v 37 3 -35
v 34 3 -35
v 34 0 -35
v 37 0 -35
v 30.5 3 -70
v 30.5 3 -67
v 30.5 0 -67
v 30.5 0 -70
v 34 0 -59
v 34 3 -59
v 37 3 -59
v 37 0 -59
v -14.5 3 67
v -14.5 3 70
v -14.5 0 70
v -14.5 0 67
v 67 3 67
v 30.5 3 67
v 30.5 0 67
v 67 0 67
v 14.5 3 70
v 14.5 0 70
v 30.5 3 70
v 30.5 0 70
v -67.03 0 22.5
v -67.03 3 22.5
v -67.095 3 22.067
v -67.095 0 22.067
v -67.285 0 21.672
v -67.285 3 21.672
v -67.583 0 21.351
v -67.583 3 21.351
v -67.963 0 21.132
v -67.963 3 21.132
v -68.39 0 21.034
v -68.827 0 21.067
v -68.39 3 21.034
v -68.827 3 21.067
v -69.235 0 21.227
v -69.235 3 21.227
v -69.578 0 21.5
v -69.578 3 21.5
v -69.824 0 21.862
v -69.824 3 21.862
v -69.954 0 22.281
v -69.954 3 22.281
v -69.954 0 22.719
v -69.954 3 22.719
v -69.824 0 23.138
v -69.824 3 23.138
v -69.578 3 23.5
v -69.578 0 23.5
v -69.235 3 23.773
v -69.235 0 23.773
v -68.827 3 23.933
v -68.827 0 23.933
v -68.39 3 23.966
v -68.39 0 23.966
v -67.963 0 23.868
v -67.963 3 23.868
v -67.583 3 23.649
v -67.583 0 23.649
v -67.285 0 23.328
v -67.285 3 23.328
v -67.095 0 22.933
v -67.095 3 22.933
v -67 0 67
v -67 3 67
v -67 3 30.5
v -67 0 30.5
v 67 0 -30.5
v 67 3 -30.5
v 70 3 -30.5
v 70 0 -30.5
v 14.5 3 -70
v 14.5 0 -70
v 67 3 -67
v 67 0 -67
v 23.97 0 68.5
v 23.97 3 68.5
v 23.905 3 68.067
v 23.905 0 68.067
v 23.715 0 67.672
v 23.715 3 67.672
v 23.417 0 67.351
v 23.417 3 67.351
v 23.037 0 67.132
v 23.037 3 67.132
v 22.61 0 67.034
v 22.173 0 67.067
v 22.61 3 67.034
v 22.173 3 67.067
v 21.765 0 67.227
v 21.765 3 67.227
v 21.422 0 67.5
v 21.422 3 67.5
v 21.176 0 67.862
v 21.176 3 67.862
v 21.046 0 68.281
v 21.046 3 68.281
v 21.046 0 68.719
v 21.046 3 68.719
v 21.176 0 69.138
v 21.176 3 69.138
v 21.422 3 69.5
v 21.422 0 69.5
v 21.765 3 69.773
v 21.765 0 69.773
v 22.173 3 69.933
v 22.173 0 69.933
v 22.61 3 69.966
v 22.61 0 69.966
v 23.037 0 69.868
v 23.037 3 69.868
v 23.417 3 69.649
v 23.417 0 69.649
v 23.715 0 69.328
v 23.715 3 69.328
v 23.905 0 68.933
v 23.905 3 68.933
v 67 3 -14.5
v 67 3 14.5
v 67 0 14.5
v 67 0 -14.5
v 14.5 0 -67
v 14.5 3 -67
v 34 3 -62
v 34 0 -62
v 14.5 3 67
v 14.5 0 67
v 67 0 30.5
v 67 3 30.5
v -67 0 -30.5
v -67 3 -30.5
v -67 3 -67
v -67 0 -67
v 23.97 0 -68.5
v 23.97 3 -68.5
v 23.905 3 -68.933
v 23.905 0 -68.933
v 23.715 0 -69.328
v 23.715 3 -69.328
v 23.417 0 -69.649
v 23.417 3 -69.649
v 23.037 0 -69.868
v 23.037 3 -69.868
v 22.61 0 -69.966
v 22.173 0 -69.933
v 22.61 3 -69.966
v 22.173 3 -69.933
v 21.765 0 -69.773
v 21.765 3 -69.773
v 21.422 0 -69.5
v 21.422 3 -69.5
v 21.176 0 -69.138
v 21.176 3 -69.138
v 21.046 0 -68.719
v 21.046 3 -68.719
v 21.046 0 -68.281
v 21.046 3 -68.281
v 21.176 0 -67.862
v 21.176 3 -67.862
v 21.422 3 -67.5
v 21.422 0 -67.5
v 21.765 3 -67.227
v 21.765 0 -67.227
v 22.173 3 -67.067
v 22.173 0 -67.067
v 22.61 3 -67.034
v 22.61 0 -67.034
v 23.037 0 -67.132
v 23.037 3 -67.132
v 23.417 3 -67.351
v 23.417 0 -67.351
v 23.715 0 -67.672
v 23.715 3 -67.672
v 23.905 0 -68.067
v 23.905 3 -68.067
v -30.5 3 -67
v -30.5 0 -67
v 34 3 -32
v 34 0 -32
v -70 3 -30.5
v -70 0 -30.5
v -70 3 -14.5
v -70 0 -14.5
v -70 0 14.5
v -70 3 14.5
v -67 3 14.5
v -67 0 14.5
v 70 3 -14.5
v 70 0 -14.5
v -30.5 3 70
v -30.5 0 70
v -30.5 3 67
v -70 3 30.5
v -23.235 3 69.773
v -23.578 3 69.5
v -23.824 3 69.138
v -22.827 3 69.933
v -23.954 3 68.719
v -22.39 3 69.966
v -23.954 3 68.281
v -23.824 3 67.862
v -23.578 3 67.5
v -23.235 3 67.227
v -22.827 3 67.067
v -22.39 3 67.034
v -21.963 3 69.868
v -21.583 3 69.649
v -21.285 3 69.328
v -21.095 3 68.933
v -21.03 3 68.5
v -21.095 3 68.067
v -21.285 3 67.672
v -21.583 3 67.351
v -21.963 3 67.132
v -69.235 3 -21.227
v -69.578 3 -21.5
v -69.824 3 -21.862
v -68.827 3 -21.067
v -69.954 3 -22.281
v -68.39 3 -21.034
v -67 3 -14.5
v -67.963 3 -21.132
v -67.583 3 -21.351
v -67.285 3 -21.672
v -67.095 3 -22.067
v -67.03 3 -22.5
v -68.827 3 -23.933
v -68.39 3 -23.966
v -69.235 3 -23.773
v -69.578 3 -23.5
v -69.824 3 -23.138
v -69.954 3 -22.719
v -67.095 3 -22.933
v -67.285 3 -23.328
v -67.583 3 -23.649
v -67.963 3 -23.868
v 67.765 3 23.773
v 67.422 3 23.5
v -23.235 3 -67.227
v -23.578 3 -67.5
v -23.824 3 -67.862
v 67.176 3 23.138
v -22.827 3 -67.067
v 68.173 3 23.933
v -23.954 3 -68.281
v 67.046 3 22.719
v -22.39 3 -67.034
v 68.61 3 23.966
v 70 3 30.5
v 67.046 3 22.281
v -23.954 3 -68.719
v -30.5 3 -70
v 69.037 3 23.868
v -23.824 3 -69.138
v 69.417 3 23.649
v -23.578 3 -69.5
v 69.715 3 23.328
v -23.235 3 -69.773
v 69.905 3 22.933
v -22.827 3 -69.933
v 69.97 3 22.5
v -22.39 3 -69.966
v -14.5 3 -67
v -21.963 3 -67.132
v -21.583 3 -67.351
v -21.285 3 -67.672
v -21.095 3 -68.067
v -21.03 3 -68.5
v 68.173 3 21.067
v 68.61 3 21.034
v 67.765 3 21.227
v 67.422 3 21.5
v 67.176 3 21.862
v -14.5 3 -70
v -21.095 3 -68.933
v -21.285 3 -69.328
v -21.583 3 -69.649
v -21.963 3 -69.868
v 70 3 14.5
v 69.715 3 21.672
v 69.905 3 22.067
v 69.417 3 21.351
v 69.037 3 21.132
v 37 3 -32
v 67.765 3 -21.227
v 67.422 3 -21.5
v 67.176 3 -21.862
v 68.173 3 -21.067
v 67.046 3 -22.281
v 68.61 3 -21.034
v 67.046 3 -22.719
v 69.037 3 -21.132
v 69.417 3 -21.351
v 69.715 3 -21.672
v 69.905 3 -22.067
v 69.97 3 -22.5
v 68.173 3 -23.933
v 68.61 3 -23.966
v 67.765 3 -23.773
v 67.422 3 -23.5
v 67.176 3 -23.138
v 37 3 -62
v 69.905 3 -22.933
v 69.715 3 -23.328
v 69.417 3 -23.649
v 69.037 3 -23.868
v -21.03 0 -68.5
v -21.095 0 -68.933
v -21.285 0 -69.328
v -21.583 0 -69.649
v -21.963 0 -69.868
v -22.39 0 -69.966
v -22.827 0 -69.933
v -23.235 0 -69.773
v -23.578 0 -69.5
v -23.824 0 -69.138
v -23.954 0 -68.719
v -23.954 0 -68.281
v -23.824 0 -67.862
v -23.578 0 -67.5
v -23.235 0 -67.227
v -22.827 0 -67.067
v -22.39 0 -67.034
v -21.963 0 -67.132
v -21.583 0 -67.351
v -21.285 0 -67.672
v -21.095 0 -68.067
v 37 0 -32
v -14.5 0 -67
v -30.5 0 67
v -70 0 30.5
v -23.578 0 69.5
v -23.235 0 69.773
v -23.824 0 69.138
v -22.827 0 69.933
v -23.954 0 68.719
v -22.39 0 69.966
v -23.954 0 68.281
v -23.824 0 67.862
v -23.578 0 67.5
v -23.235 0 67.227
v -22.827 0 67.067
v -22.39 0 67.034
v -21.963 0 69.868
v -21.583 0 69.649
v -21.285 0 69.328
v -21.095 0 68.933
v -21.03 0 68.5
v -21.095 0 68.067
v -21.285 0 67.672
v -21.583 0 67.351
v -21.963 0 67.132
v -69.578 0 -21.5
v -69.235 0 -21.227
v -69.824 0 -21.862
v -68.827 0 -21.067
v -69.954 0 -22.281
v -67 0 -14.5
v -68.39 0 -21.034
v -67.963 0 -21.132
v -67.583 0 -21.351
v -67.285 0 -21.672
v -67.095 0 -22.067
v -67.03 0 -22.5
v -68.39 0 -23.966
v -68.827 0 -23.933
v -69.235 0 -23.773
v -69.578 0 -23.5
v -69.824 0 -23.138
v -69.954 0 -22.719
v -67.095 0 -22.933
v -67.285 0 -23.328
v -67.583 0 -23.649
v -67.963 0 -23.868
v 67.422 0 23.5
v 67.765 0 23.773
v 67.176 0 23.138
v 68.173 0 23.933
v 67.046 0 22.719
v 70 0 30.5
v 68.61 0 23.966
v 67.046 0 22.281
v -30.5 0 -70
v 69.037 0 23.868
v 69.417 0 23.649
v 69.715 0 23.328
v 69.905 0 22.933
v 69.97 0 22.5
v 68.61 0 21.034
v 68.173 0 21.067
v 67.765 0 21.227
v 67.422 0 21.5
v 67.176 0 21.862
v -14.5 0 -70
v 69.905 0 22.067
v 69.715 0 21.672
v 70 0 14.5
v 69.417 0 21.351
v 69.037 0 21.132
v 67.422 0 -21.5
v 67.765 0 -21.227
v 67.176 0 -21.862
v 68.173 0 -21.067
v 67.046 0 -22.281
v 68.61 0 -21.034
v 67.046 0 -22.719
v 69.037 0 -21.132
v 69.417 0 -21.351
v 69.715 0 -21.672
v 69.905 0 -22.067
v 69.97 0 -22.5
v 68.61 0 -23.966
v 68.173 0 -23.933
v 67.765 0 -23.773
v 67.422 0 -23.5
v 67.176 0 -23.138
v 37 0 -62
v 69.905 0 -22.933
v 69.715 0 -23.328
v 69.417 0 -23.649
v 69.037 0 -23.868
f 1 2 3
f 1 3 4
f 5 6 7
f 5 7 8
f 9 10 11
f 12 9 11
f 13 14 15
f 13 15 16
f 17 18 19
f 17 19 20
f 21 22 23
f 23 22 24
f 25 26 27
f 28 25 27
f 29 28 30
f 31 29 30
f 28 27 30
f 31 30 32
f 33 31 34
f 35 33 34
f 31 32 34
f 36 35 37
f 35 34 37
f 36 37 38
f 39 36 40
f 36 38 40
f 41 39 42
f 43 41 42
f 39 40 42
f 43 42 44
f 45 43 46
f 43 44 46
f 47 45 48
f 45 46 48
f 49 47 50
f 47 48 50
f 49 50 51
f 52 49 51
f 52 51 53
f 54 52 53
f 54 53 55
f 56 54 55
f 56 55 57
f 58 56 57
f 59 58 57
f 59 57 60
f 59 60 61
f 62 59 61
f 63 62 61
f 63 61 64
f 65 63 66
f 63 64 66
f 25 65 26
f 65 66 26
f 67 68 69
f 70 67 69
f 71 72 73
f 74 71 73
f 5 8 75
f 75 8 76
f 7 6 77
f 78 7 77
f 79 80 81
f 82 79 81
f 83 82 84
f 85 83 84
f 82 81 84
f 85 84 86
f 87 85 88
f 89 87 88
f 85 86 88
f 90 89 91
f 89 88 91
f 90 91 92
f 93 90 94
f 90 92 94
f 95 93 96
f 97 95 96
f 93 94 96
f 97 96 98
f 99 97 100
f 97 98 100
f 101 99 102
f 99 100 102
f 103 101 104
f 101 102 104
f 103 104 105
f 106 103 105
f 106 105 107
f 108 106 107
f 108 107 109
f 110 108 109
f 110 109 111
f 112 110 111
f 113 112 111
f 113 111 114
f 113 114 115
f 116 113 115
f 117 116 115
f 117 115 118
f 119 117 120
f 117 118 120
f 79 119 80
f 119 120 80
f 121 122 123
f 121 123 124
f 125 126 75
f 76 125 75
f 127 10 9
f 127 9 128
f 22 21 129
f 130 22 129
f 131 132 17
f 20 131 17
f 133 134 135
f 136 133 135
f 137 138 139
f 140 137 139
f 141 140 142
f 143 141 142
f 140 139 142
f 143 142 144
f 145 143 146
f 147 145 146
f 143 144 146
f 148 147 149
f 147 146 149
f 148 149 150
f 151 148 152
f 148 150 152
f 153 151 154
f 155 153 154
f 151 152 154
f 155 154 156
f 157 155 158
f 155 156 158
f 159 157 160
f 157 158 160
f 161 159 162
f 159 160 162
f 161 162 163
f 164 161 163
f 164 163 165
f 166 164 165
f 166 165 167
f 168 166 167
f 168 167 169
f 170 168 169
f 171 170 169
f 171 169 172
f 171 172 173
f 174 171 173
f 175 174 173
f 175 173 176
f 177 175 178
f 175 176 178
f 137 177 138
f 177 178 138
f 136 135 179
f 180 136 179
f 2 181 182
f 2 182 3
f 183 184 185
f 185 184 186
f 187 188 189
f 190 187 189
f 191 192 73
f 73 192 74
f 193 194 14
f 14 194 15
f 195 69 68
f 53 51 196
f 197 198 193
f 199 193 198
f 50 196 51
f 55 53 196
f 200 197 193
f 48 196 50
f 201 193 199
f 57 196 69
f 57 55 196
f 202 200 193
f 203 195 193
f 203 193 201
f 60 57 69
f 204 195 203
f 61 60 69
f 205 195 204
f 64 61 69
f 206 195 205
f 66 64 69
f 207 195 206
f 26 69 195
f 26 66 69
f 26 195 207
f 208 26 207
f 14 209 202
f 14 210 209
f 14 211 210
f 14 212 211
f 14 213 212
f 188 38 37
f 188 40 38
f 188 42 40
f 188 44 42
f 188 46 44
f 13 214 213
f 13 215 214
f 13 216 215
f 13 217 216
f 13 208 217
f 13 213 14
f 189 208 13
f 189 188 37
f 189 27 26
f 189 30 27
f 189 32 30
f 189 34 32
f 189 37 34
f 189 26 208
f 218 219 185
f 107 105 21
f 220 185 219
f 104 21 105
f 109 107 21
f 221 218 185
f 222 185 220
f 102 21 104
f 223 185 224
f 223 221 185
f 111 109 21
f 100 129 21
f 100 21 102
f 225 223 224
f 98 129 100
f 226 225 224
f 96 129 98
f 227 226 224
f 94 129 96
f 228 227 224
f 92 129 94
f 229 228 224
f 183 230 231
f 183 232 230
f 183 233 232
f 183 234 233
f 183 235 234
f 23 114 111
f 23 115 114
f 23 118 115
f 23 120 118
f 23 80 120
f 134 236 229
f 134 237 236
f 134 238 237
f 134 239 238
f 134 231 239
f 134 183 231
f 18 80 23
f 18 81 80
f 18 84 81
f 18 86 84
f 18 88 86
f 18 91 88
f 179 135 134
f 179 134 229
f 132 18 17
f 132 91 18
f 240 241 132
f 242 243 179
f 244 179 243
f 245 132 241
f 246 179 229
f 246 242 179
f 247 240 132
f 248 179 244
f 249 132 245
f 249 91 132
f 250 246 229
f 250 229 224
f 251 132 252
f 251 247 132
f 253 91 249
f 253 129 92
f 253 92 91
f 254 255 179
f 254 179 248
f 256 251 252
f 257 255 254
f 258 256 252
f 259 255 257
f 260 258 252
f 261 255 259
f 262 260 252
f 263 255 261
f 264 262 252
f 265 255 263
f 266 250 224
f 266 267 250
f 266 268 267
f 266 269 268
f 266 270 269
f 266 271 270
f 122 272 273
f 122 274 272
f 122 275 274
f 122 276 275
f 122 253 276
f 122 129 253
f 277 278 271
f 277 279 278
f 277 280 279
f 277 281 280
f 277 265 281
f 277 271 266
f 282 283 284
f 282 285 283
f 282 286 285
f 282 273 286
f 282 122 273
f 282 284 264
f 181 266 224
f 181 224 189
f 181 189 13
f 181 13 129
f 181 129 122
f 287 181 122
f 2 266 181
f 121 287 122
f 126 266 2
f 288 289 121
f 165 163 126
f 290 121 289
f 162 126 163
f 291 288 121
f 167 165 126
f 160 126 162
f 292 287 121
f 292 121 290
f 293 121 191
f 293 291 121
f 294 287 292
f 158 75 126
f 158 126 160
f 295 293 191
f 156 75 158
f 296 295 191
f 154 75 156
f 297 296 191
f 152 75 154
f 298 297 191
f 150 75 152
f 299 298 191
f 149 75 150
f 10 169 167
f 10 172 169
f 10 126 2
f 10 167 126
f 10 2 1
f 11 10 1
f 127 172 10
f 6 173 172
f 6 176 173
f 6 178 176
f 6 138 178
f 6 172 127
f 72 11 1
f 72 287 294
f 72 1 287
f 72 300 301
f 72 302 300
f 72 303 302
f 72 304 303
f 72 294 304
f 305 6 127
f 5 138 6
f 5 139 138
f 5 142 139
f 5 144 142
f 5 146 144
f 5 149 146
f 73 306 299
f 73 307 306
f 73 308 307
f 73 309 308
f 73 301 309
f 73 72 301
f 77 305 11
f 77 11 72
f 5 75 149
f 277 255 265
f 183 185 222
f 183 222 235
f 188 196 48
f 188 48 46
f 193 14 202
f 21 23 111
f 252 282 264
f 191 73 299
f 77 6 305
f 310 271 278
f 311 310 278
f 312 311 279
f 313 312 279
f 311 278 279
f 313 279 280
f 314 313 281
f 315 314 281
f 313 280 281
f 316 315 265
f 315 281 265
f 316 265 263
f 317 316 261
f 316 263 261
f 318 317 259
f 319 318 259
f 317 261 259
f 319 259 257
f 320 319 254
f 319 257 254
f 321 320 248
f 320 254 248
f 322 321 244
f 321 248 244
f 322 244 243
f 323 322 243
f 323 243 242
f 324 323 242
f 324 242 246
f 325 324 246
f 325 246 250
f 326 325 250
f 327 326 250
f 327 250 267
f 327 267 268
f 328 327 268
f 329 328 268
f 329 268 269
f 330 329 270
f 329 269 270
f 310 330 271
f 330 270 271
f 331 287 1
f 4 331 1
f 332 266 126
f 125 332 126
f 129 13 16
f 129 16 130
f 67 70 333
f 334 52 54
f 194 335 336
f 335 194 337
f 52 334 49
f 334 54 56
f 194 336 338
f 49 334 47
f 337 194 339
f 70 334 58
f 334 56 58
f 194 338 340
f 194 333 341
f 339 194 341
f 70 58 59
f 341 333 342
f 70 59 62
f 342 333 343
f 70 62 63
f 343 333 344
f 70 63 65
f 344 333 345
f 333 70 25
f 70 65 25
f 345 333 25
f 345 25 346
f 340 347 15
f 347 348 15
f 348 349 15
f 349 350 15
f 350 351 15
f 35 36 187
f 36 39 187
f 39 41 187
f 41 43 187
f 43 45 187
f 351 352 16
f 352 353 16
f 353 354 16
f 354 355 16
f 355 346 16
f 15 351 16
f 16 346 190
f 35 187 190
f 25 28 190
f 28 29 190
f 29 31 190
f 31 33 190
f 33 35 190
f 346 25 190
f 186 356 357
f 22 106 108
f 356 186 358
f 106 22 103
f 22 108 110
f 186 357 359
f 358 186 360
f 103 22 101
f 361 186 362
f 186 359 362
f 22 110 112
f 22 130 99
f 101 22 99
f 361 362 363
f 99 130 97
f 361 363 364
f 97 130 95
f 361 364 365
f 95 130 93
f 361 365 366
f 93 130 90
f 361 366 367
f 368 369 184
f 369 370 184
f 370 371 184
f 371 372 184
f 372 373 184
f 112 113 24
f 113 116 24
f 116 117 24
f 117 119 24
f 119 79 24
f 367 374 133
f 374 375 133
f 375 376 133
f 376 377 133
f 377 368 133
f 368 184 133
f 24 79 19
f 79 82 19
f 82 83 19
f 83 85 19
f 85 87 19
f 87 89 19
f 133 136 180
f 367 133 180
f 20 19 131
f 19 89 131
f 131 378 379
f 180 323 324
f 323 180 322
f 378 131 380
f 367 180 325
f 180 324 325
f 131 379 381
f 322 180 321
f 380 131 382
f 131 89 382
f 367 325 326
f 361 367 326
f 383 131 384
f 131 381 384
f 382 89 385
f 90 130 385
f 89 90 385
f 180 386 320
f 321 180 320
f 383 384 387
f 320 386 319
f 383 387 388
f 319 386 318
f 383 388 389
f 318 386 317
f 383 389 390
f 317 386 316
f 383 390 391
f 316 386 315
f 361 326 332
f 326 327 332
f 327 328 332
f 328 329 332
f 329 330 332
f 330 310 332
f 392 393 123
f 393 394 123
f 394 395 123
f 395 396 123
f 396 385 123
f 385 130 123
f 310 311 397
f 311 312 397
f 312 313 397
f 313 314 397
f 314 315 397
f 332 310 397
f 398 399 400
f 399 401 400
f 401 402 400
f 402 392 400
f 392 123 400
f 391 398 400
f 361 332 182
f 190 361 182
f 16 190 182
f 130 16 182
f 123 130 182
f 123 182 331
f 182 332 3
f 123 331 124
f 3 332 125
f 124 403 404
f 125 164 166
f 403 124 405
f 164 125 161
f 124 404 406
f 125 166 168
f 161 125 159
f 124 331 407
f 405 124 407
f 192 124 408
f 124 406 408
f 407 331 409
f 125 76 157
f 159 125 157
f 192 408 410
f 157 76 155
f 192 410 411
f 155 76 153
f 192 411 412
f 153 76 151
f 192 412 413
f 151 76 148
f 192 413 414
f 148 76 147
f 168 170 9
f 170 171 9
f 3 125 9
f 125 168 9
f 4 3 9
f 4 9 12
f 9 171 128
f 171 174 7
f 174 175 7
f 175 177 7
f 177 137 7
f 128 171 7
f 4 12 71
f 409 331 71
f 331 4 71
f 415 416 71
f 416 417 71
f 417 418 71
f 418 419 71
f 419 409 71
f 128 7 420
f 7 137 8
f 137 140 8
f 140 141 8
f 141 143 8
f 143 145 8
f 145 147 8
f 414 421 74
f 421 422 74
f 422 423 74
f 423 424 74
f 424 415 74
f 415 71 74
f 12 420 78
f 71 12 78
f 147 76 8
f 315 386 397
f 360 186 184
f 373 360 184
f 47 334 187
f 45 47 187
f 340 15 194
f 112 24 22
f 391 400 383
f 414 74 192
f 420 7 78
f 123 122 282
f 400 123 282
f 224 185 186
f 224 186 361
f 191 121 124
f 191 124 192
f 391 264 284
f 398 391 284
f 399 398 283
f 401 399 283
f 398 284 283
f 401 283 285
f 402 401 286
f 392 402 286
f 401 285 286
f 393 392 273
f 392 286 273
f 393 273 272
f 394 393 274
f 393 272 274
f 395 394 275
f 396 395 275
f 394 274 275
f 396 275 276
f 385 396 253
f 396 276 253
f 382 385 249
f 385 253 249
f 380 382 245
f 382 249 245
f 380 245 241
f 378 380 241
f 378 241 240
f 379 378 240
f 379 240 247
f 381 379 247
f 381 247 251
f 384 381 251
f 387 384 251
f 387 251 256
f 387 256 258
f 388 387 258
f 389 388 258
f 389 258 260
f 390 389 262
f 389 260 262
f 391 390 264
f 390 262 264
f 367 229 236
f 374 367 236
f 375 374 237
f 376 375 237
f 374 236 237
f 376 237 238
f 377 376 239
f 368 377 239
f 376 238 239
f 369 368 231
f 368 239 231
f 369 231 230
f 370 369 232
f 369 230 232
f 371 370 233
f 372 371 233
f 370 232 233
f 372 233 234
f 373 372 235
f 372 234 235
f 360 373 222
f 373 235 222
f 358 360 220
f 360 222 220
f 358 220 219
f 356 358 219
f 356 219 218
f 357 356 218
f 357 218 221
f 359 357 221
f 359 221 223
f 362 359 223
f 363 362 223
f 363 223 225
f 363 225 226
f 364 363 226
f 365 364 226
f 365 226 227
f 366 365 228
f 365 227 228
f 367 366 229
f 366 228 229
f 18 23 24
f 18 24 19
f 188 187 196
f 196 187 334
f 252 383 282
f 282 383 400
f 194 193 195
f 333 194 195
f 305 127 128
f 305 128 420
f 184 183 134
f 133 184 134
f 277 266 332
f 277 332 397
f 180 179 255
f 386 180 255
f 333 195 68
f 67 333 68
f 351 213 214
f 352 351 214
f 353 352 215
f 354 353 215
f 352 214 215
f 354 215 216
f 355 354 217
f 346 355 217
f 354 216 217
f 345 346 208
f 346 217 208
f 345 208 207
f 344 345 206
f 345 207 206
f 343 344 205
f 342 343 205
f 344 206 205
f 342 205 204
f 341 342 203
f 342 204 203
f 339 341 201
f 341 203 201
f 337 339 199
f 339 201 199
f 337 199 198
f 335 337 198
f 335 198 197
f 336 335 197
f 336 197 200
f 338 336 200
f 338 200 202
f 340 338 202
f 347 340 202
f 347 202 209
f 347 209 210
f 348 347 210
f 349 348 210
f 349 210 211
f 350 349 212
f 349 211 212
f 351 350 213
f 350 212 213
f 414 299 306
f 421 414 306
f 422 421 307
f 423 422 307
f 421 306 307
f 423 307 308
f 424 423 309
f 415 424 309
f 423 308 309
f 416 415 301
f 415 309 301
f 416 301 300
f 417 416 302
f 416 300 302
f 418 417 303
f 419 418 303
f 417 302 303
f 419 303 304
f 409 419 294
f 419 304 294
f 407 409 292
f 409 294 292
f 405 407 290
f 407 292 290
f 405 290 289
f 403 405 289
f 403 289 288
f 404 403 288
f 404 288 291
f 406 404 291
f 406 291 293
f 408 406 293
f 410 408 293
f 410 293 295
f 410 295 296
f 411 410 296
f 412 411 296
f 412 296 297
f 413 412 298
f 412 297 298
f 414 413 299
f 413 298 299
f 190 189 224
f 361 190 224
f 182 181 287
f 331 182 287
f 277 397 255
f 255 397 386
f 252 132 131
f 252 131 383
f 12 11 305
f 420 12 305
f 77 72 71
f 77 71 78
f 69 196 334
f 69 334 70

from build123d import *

# Parameters (mm, degrees)
BOSS_EXTRUDE1_DEPTH = 3
SKETCH2_W           = 3
SKETCH2_H           = 3
SKETCH2_H_2         = 36.5
SKETCH2_W_2         = 36.5
SKETCH2_W_3         = 29
SKETCH2_H_3         = 29
CUT_EXTRUDE2_DEPTH  = 3
SKETCH3_R           = 1.47
CUT_EXTRUDE3_DEPTH  = 3
SKETCH4_W           = 3
SKETCH4_H           = 3
CUT_EXTRUDE4_DEPTH  = 3


with BuildPart() as part:
    # Sketch1 → Boss-Extrude1 (new body)
    with BuildSketch(Plane(origin=(0, 0, 0), x_dir=(1, 0, 0), z_dir=(0, 1, 0))):
        Polygon((70, 70), (-70, 70), (0, 0), align=None)
        Polygon((0, 0), (-70, 70), (-70, -70), align=None)
        Polygon((70, -70), (0, 0), (-70, -70), align=None)
        Polygon((70, 70), (0, 0), (70, -70), align=None)
    extrude(amount=BOSS_EXTRUDE1_DEPTH)

    # Sketch2 → Cut-Extrude2 (cut)
    with BuildSketch(Plane(origin=(0, 3, 0), x_dir=(1, 0, 0), z_dir=(0, 1, 0))):
        with Locations((-68.5, 68.5)):
            Rectangle(SKETCH2_W, SKETCH2_H)
        with Locations((-68.5, 48.75)):
            Rectangle(SKETCH2_W, SKETCH2_H_2)
        with Locations((-48.75, 68.5)):
            Rectangle(SKETCH2_W_2, SKETCH2_H)
        with Locations((48.75, 68.5)):
            Rectangle(SKETCH2_W_2, SKETCH2_H)
        with Locations((68.5, 68.5)):
            Rectangle(SKETCH2_W, SKETCH2_H)
        with Locations((68.5, 48.75)):
            Rectangle(SKETCH2_W, SKETCH2_H_2)
        with Locations((68.5, -68.5)):
            Rectangle(SKETCH2_W, SKETCH2_H)
        with Locations((68.5, -48.75)):
            Rectangle(SKETCH2_W, SKETCH2_H_2)
        with Locations((48.75, -68.5)):
            Rectangle(SKETCH2_W_2, SKETCH2_H)
        with Locations((-48.75, -68.5)):
            Rectangle(SKETCH2_W_2, SKETCH2_H)
        with Locations((-68.5, -68.5)):
            Rectangle(SKETCH2_W, SKETCH2_H)
        with Locations((-68.5, -48.75)):
            Rectangle(SKETCH2_W, SKETCH2_H_2)
        with Locations((0, 68.5)):
            Rectangle(SKETCH2_W_3, SKETCH2_H)
        with Locations((0, -68.5)):
            Rectangle(SKETCH2_W_3, SKETCH2_H)
        with Locations((68.5, 0)):
            Rectangle(SKETCH2_W, SKETCH2_H_3)
        with Locations((-68.5, 0)):
            Rectangle(SKETCH2_W, SKETCH2_H_3)
    extrude(amount=-CUT_EXTRUDE2_DEPTH, mode=Mode.SUBTRACT)

    # Sketch3 → Cut-Extrude3 (cut)
    with BuildSketch(Plane(origin=(0, 3, 0), x_dir=(1, 0, 0), z_dir=(0, 1, 0))):
        with Locations((-22.5, 68.5)):
            Circle(SKETCH3_R)
        with Locations((22.5, 68.5)):
            Circle(SKETCH3_R)
        with Locations((22.5, -68.5)):
            Circle(SKETCH3_R)
        with Locations((-22.5, -68.5)):
            Circle(SKETCH3_R)
        with Locations((-68.5, 22.5)):
            Circle(SKETCH3_R)
        with Locations((-68.5, -22.5)):
            Circle(SKETCH3_R)
        with Locations((68.5, -22.5)):
            Circle(SKETCH3_R)
        with Locations((68.5, 22.5)):
            Circle(SKETCH3_R)
    extrude(amount=-CUT_EXTRUDE3_DEPTH, mode=Mode.SUBTRACT)

    # Sketch4 → Cut-Extrude4 (cut)
    with BuildSketch(Plane(origin=(0, 3, 0), x_dir=(1, 0, 0), z_dir=(0, 1, 0))):
        with Locations((35.5, 60.5)):
            Rectangle(SKETCH4_W, SKETCH4_H)
        with Locations((35.5, 33.5)):
            Rectangle(SKETCH4_W, SKETCH4_H)
    extrude(amount=-CUT_EXTRUDE4_DEPTH, mode=Mode.SUBTRACT)


solid = part.part
